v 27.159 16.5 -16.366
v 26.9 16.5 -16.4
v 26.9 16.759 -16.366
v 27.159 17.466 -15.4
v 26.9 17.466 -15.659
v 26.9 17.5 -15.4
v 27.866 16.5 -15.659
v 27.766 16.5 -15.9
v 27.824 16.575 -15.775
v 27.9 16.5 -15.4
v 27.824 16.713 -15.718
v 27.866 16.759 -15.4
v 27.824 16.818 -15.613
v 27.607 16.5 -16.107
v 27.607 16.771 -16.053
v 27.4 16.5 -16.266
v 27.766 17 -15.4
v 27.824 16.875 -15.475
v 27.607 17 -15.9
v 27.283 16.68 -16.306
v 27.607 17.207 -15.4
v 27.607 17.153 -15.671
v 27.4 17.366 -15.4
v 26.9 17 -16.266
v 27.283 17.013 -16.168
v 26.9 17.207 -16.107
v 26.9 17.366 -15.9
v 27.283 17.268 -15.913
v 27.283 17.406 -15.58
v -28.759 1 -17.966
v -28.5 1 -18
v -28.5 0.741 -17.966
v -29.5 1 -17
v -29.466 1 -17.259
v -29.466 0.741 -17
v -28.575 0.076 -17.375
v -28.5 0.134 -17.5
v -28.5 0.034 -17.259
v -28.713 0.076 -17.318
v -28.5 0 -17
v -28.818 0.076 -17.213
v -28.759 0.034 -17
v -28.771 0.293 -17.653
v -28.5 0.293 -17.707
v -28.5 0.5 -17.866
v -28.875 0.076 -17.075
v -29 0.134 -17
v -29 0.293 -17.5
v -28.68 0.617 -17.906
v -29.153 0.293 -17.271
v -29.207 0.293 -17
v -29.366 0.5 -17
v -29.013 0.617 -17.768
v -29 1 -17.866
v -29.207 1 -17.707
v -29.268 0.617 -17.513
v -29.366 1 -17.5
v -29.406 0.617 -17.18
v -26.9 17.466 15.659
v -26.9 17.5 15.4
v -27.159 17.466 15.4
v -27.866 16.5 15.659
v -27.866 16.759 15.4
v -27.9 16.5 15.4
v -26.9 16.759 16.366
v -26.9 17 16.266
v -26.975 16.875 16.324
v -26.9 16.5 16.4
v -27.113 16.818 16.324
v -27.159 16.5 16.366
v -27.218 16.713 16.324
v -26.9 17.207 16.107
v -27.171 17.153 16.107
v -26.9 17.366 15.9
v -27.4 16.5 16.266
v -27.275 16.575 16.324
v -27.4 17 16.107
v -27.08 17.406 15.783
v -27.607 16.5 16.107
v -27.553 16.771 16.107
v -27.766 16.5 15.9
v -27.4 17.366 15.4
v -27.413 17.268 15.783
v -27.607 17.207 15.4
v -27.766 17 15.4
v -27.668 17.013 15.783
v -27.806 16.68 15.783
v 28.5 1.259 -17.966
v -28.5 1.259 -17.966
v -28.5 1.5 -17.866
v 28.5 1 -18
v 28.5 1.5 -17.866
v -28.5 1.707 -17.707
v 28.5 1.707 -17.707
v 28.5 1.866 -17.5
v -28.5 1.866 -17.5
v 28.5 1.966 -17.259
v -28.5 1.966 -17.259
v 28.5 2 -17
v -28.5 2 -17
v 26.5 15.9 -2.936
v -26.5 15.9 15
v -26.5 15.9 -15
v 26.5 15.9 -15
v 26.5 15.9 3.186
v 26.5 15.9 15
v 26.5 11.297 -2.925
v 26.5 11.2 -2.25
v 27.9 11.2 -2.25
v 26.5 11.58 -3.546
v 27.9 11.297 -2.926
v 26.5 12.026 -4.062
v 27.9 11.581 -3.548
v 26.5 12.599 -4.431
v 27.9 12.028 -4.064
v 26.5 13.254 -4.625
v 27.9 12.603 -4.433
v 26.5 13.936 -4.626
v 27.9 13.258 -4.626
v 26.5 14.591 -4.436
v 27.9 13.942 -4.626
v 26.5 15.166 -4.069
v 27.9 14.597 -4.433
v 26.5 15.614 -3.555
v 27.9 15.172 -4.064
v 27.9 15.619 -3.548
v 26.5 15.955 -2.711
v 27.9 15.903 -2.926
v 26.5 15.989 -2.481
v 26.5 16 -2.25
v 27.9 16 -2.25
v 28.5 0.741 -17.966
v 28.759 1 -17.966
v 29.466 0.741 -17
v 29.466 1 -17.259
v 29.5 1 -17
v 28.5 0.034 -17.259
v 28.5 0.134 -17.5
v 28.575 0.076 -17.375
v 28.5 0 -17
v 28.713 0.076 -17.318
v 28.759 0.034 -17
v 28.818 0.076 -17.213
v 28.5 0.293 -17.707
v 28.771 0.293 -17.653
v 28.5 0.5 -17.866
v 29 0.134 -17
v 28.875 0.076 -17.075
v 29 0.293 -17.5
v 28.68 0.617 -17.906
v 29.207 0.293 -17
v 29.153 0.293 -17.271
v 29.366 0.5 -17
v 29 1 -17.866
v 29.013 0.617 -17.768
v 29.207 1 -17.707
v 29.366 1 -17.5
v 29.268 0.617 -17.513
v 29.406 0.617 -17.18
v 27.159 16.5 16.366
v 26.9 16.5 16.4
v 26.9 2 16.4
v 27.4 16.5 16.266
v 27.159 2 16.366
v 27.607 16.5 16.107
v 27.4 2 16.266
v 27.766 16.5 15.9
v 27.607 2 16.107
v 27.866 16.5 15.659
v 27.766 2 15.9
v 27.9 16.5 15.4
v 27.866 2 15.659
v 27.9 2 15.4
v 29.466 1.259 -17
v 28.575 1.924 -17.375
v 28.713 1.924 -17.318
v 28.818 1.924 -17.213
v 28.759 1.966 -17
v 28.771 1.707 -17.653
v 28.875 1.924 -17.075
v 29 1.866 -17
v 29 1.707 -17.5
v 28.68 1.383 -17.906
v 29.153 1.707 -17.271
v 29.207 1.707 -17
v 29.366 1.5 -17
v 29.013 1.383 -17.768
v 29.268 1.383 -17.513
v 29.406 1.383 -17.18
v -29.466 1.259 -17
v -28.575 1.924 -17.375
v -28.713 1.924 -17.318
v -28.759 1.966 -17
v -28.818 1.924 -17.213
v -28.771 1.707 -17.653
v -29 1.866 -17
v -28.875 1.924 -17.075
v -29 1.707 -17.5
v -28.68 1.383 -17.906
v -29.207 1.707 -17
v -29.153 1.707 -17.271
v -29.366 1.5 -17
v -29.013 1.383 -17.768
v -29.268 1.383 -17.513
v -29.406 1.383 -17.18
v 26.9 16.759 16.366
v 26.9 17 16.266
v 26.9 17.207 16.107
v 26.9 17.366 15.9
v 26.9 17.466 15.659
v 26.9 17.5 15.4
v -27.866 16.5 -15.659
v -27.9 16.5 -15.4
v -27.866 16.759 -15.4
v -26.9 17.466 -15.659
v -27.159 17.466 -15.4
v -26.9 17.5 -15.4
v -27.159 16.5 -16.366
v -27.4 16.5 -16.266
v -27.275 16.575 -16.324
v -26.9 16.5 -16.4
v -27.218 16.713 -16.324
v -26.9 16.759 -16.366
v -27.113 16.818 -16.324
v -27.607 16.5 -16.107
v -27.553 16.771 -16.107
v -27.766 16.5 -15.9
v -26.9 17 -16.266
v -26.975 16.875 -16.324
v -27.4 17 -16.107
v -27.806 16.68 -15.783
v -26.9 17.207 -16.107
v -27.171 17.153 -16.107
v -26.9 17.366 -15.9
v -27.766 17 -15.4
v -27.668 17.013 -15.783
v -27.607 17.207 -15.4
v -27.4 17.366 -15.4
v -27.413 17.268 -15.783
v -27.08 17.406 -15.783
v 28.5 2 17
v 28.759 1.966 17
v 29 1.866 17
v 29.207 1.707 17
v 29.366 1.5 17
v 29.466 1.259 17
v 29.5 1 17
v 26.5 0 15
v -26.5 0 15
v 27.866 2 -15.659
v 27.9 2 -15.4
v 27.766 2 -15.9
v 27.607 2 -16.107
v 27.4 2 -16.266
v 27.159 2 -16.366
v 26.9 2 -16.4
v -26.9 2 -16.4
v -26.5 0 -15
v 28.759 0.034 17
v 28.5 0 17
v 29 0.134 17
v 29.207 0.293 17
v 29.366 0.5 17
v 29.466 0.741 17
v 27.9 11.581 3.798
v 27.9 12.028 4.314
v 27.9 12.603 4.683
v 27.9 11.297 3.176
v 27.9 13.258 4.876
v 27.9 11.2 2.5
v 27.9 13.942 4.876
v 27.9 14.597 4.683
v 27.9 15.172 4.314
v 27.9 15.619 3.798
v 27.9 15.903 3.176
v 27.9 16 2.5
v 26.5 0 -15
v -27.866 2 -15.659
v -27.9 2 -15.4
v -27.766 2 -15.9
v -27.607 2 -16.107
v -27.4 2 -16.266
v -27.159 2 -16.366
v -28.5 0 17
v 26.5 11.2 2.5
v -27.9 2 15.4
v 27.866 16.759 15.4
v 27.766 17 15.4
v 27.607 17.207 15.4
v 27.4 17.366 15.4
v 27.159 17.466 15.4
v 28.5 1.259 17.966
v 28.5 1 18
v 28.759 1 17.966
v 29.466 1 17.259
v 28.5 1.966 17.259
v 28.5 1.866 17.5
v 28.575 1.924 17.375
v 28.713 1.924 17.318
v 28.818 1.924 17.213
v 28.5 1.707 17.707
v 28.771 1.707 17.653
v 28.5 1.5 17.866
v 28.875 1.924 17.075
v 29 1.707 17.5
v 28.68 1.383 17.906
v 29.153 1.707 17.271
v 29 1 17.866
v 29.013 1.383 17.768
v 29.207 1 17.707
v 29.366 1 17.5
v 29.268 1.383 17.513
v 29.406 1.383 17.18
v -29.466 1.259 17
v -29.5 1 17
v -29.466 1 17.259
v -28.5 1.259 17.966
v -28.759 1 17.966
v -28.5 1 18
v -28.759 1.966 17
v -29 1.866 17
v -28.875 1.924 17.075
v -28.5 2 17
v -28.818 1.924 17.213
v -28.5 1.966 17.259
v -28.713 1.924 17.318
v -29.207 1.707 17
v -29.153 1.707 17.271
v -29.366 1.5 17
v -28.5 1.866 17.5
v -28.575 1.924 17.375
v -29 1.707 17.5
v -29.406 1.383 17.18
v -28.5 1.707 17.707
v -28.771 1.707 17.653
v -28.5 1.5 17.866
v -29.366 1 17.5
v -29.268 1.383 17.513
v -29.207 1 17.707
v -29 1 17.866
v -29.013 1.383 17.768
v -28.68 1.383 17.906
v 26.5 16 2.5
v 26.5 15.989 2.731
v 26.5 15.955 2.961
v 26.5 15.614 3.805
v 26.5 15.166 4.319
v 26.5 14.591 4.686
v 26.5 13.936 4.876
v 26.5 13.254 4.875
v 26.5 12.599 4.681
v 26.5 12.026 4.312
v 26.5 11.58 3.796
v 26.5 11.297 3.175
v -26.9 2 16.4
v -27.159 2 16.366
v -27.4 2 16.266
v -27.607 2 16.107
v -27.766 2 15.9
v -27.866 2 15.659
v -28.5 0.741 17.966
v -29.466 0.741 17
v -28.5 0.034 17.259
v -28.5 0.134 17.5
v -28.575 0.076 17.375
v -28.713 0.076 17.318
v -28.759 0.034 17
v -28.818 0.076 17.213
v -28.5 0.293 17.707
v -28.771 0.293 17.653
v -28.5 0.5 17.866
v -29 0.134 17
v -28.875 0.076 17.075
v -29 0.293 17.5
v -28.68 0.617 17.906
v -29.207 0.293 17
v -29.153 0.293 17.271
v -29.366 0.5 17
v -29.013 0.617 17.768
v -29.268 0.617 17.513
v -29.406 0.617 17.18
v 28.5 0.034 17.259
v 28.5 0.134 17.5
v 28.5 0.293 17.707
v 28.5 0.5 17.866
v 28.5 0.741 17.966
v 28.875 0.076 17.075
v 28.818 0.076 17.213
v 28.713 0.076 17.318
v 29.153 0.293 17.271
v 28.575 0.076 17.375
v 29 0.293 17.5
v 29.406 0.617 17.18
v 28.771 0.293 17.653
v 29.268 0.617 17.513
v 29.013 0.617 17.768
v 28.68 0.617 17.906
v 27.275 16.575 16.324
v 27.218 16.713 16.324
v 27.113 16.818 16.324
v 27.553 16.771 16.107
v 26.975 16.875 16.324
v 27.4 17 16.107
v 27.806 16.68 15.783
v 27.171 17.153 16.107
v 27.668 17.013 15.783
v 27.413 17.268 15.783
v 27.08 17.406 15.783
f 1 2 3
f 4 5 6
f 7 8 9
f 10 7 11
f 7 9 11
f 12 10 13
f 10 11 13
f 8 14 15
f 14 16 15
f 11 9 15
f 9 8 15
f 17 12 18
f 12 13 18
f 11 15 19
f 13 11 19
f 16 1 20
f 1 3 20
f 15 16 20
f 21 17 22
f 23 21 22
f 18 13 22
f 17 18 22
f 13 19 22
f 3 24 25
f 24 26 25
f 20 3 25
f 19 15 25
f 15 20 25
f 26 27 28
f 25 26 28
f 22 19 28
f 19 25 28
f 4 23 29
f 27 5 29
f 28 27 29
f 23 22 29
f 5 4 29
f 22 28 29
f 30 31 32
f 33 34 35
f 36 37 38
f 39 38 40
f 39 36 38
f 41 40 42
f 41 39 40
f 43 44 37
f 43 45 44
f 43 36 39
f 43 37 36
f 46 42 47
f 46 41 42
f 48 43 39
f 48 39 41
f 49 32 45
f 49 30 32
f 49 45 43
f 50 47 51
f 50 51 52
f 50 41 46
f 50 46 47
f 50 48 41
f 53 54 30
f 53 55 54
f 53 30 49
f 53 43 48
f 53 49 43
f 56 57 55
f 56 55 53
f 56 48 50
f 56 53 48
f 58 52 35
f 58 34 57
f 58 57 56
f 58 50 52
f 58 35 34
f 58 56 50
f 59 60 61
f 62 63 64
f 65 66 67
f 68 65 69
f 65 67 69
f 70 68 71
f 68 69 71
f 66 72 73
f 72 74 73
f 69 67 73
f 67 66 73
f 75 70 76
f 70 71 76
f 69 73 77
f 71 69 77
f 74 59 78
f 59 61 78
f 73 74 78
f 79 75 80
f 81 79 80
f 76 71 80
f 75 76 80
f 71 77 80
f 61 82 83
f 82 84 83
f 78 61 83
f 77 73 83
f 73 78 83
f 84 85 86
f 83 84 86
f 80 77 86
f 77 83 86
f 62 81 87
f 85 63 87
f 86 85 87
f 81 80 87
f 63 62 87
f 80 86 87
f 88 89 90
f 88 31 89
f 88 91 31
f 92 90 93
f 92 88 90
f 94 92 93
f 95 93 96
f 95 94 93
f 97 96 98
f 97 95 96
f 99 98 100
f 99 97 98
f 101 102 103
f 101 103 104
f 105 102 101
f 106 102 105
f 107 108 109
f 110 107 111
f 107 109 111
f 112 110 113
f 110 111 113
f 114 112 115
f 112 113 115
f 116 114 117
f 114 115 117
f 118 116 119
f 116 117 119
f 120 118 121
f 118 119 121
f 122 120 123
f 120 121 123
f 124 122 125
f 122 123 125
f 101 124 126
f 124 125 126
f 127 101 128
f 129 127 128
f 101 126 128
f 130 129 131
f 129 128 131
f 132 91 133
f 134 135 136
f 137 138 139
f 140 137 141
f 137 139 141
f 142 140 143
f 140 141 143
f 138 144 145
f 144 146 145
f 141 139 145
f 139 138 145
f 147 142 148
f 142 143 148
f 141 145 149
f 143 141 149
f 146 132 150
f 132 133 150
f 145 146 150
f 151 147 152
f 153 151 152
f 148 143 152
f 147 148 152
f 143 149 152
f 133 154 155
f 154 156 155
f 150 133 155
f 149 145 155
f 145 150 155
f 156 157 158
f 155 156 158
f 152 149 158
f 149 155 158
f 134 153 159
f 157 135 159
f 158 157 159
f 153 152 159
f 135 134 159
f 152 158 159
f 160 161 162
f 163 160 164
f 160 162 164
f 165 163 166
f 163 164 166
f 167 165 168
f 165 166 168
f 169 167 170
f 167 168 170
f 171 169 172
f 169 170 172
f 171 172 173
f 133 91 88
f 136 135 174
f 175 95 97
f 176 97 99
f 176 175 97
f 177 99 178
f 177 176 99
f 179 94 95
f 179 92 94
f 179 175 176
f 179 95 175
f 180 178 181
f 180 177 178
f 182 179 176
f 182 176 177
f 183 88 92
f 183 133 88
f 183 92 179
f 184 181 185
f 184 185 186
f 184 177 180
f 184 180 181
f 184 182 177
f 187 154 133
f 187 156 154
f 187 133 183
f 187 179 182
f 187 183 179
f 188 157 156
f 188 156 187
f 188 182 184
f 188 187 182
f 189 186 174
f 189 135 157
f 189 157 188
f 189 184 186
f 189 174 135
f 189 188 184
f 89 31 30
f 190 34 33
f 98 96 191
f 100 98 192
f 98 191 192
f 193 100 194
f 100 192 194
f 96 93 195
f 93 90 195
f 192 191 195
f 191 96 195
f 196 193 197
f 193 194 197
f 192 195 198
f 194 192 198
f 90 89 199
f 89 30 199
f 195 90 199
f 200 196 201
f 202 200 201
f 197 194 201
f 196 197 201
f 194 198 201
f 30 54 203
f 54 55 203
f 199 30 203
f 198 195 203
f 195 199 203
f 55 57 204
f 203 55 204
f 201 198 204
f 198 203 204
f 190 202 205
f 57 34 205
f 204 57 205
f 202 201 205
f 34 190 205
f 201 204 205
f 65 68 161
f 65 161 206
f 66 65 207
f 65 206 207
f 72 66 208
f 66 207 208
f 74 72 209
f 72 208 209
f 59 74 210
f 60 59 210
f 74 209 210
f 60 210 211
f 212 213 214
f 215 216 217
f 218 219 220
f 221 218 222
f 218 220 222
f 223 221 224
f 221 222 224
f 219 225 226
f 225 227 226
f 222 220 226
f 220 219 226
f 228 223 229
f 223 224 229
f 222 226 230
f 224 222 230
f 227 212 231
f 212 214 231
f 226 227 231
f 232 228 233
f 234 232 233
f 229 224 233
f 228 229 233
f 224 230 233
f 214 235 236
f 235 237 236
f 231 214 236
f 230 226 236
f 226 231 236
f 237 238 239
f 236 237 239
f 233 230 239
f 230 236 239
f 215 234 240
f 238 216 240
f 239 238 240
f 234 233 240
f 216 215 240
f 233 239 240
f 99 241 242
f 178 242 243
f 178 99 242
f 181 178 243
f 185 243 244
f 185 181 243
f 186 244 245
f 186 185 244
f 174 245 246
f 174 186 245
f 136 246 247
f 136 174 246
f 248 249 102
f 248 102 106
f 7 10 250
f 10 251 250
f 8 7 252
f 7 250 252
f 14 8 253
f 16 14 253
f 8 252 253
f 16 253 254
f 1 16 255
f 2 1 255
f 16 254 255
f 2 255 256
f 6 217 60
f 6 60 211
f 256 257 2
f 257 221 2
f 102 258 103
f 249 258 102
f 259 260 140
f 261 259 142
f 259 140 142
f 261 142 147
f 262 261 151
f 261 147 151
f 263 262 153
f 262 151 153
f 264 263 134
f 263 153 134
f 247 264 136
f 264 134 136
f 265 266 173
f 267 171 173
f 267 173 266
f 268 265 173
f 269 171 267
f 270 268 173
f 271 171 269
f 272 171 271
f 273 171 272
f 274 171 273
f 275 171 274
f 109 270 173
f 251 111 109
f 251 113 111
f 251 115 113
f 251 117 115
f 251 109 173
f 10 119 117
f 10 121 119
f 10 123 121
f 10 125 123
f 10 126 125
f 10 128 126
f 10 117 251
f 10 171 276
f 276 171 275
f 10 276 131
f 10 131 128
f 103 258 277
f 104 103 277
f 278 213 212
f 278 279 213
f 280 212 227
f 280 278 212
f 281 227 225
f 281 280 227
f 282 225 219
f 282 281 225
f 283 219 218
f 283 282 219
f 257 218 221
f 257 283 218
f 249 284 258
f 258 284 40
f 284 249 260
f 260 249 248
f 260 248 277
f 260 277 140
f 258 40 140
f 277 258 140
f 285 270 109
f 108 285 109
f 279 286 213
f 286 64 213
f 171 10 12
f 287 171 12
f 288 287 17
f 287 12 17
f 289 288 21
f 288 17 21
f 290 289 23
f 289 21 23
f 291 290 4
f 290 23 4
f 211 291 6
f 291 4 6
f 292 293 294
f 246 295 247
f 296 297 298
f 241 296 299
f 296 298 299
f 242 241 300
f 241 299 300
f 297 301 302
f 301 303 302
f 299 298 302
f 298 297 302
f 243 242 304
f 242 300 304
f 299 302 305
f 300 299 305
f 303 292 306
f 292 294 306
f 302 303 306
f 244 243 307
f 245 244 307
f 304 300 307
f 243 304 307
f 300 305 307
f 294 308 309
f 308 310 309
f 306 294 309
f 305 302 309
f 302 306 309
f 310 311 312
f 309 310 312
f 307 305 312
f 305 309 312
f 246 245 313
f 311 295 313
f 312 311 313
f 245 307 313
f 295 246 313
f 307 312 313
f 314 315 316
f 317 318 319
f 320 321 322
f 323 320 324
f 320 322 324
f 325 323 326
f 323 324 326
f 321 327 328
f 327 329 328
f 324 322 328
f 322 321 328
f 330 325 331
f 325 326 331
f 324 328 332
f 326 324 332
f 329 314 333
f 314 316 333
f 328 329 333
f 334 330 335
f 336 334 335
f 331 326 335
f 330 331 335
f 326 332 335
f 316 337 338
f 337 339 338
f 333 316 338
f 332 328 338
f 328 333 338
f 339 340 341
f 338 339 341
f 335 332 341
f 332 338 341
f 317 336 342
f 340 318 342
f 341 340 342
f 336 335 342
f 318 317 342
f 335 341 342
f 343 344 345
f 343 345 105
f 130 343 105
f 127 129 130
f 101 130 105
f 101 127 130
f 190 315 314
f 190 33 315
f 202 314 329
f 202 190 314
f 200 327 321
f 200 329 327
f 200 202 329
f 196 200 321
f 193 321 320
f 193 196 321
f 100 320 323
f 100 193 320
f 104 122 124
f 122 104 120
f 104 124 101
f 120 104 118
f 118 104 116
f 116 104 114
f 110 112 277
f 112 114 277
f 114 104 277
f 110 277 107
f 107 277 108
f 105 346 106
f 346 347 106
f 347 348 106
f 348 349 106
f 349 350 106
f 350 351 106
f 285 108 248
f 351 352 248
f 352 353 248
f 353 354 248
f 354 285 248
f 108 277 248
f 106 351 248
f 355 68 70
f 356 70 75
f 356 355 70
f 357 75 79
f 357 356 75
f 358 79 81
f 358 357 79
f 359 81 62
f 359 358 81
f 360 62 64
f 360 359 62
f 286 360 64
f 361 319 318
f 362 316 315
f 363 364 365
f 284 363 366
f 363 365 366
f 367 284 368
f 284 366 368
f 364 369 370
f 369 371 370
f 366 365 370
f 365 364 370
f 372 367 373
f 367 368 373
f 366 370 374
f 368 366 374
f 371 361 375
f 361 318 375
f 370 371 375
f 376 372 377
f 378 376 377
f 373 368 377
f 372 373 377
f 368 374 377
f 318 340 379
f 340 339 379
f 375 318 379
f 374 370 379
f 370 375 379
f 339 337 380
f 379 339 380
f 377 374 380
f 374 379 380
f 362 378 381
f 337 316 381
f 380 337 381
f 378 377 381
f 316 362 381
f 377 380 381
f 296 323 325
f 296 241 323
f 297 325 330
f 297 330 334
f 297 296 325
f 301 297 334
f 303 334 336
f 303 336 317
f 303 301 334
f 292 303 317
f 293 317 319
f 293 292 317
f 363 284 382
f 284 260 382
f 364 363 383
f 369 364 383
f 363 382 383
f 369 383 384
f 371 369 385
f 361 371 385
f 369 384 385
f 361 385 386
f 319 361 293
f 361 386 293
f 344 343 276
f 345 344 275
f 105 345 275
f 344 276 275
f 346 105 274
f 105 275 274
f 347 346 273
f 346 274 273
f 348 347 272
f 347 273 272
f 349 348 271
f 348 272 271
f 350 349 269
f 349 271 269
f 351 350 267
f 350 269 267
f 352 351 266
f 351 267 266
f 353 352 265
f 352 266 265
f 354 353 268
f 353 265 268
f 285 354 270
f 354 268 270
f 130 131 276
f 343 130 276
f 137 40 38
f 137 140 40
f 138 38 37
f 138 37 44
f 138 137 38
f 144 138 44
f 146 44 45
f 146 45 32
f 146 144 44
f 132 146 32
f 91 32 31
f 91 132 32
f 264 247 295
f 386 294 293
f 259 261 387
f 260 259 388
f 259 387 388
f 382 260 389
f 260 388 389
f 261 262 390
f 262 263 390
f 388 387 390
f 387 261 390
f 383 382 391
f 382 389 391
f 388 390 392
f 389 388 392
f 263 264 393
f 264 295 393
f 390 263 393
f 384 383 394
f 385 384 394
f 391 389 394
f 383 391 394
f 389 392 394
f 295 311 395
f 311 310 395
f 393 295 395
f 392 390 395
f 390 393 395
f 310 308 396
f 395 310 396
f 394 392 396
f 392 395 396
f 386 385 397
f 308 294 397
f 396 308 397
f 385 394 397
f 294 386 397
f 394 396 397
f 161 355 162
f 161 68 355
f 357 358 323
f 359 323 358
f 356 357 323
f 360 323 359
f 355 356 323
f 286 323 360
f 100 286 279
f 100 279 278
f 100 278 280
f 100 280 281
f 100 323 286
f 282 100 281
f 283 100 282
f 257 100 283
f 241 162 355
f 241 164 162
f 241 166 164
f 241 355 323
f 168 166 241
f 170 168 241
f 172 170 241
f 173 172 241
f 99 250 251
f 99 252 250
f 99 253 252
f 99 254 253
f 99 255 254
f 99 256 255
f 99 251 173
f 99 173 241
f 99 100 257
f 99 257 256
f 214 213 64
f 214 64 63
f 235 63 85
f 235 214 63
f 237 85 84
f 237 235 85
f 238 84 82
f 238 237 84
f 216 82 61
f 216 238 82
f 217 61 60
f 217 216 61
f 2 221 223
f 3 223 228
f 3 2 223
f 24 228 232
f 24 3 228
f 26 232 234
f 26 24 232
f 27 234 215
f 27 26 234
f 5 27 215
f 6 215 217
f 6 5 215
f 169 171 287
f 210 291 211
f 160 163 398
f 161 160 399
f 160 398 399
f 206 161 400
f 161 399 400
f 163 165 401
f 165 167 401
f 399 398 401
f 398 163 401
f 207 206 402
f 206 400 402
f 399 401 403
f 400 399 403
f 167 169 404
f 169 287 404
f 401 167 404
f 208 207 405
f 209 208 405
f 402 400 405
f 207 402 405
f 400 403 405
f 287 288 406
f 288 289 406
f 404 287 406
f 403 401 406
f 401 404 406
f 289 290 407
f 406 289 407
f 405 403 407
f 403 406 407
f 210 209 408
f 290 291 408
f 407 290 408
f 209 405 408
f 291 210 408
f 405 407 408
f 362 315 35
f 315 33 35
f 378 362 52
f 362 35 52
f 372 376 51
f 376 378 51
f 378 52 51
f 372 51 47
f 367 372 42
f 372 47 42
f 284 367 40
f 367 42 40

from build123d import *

# Parameters (mm, degrees)
SKETCH1_W           = 59
SKETCH1_H           = 36
BOSS_EXTRUDE1_DEPTH = 17.5
SKETCH2_W           = 53
SKETCH2_H           = 30
CUT_EXTRUDE1_DEPTH  = 15.9
SKETCH3_OUTSIDE_W   = 75.26
SKETCH3_OUTSIDE_H   = 52.26
SKETCH3_OUTSIDE_W_2 = 55.8
SKETCH3_OUTSIDE_H_2 = 32.8
CUT_EXTRUDE2_DEPTH  = 15.5
CUT_EXTRUDE3_DEPTH  = 1.4
FILLET1_R           = 1


with BuildPart() as part:
    # Sketch1 → Boss-Extrude1 (new body)
    with BuildSketch(Plane(origin=(0, 0, 0), x_dir=(1, 0, 0), z_dir=(0, 1, 0))):
        Rectangle(SKETCH1_W, SKETCH1_H)
    extrude(amount=BOSS_EXTRUDE1_DEPTH)

    # Sketch2 → Cut-Extrude1 (cut)
    with BuildSketch(Plane.XZ):
        Rectangle(SKETCH2_W, SKETCH2_H)
    extrude(amount=-CUT_EXTRUDE1_DEPTH, mode=Mode.SUBTRACT)

    # Sketch3 outside → Cut-Extrude2 (cut)
    with BuildSketch(Plane(origin=(0, 17.5, 0), x_dir=(1, 0, 0), z_dir=(0, 1, 0))):
        Rectangle(SKETCH3_OUTSIDE_W, SKETCH3_OUTSIDE_H)
        Rectangle(SKETCH3_OUTSIDE_W_2, SKETCH3_OUTSIDE_H_2, mode=Mode.SUBTRACT)
    extrude(amount=-CUT_EXTRUDE2_DEPTH, mode=Mode.SUBTRACT)

    # Sketch4 → Cut-Extrude3 (cut)
    with BuildSketch(Plane(origin=(27.9, 0, 0), x_dir=(0, 0, -1), z_dir=(1, 0, 0))):
        with BuildLine():
            Line((2.25, 16), (-2.5, 16))
            ThreePointArc((-2.5, 16), (-4.9, 13.6), (-2.5, 11.2))
            Line((-2.5, 11.2), (2.25, 11.2))
            ThreePointArc((2.25, 11.2), (4.65, 13.6), (2.25, 16))
        make_face()
    extrude(amount=-CUT_EXTRUDE3_DEPTH, mode=Mode.SUBTRACT)

    # Fillet1
    fillet1_edges = [part.edges().sort_by_distance(p)[0] for p in [
        (-29.5, 1, -18),
        (29.5, 1, -18),
        (0, 2, -18),
        (29.5, 1, 18),
        (-29.5, 1, 18),
        (-29.5, 2, 0),
        (0, 2, 18),
        (29.5, 2, 0),
        (-27.9, 17.5, 0),
        (-27.9, 9.75, -16.4),
        (0, 17.5, -16.4),
        (27.9, 9.75, -16.4),
        (27.9, 17.5, 0),
        (27.9, 9.75, 16.4),
        (0, 17.5, 16.4),
        (-27.9, 9.75, 16.4),
        (0, 0, -18),
        (29.5, 0, 0),
        (0, 0, 18),
        (-29.5, 0, 0),
    ]]
    fillet(fillet1_edges, radius=FILLET1_R - 0.0001)  # a hair under: the kernel refuses the full size


solid = part.part
